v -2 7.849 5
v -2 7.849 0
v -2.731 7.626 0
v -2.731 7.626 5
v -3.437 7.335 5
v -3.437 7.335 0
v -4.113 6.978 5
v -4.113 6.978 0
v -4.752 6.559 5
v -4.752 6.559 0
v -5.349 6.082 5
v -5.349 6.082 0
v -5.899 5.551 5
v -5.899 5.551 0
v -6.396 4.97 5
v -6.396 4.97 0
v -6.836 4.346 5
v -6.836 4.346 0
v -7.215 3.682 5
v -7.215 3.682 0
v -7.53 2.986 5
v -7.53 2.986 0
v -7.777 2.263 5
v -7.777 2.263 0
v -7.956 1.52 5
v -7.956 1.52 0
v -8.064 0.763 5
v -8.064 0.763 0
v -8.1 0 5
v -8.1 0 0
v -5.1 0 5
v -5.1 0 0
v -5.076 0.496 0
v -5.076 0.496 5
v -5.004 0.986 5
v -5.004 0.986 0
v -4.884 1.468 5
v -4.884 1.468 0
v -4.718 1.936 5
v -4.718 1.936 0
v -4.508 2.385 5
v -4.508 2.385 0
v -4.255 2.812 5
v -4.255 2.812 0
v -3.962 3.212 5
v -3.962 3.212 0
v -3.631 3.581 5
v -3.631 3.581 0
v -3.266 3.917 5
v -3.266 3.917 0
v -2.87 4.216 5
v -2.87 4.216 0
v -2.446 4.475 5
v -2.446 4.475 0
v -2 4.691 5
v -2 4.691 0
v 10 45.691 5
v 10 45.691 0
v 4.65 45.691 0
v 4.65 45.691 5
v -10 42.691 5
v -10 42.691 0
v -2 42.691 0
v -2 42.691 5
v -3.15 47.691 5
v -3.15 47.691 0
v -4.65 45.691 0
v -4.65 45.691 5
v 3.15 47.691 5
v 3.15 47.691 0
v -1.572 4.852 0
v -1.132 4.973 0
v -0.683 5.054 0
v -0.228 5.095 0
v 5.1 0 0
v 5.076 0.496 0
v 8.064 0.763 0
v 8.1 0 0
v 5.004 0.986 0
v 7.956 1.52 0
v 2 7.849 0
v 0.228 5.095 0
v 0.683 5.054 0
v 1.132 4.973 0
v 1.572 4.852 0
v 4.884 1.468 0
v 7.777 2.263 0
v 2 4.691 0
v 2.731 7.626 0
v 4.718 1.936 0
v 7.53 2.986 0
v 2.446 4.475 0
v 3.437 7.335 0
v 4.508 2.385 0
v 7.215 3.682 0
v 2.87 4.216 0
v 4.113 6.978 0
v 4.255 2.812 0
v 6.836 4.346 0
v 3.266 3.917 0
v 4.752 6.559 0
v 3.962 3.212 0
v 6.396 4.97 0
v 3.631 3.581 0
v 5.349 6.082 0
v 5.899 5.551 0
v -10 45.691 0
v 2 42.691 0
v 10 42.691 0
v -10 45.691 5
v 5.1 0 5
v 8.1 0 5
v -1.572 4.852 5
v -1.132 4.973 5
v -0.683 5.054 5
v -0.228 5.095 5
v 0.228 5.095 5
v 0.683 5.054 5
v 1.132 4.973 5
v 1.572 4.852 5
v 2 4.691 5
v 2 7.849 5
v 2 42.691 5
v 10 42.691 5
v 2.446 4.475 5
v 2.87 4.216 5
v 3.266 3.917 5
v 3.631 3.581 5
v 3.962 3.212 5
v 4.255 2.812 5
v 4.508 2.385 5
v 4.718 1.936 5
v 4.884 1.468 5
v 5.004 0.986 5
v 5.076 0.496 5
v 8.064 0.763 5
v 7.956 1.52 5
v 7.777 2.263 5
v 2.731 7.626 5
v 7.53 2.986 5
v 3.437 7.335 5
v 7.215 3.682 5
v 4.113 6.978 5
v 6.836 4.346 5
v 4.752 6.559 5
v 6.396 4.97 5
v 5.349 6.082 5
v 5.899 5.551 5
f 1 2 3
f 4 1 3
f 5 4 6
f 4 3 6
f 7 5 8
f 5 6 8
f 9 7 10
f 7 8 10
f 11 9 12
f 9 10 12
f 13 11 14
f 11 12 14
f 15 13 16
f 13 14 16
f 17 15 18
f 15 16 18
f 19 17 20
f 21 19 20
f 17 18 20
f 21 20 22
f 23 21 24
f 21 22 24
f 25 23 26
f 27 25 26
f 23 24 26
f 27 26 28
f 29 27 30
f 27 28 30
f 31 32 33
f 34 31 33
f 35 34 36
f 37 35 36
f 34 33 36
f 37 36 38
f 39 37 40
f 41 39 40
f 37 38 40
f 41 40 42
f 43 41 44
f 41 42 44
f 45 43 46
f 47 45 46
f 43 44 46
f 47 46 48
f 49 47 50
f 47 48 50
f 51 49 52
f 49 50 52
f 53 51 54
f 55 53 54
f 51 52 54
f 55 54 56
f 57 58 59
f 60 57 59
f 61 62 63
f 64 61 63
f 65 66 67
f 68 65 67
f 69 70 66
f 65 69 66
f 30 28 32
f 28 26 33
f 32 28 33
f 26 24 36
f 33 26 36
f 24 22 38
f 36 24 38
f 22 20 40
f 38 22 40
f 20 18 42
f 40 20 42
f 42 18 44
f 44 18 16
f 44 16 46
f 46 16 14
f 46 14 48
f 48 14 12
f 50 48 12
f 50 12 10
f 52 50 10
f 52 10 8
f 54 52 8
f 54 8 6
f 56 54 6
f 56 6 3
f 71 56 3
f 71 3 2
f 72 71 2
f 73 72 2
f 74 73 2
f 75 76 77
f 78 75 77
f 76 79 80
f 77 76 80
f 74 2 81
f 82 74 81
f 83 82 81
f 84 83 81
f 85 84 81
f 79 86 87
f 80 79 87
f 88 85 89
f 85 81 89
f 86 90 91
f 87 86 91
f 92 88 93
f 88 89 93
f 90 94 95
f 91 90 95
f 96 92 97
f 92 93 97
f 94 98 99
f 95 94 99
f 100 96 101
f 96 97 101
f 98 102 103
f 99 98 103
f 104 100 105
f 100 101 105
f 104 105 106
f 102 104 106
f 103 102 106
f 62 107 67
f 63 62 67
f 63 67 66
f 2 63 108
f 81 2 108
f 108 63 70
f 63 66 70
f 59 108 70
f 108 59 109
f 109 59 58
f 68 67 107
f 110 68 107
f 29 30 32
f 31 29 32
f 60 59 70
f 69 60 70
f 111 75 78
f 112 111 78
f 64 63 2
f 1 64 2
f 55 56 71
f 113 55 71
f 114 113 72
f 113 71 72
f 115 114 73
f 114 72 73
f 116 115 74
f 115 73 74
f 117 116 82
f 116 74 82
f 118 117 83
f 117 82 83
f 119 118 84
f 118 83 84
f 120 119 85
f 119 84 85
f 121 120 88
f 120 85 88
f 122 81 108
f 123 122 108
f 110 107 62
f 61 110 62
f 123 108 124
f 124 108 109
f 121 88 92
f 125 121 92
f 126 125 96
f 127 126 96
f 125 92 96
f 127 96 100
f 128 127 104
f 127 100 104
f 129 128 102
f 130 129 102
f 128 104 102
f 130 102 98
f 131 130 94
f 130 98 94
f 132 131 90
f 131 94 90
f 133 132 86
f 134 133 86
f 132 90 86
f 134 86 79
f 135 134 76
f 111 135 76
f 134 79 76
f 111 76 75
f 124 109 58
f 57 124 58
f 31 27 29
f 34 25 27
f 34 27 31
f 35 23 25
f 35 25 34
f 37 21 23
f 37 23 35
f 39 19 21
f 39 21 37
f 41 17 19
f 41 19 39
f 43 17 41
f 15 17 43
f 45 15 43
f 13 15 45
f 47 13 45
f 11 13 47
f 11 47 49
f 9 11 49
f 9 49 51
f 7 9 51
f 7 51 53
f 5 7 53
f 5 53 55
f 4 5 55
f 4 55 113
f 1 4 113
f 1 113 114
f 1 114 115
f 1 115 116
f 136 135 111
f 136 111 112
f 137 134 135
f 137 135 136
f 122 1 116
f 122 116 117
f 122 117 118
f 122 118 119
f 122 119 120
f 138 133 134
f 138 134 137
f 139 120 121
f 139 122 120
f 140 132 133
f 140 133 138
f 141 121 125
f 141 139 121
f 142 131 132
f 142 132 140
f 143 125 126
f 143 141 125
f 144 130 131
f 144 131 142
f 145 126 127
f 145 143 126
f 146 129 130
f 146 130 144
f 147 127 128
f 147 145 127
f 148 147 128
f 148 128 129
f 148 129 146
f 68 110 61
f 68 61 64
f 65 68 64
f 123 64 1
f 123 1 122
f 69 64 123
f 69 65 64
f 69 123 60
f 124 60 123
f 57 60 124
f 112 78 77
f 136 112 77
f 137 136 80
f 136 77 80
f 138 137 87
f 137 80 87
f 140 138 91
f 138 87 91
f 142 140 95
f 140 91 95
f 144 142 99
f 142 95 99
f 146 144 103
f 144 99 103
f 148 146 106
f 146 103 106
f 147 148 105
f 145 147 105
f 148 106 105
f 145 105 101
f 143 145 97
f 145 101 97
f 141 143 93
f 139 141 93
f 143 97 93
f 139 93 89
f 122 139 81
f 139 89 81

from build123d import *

# Parameters (mm, degrees)
F1_DEPTH = 5


with BuildPart() as f1:
    # F0 (on Top) → F1 (new body)
    with BuildSketch(Plane.XY):
        with BuildLine():
            ThreePointArc((2, 4.691482), (4.254997, 2.811583), (5.1, 0))
            Line((5.1, 0), (8.1, 0))
            ThreePointArc((8.1, 0), (6.395702, 4.970412), (2, 7.849204))
            Line((2, 7.849204), (2, 4.691482))
        make_face()
        with BuildLine():
            ThreePointArc((-2, 4.691482), (0, 5.1), (2, 4.691482))
            Line((2, 4.691482), (2, 7.849204))
            ThreePointArc((2, 7.849204), (0, 8.1), (-2, 7.849204))
            Line((-2, 7.849204), (-2, 4.691482))
        make_face()
        with BuildLine():
            ThreePointArc((-5.1, 0), (-4.254997, 2.811583), (-2, 4.691482))
            Line((-2, 4.691482), (-2, 7.849204))
            ThreePointArc((-2, 7.849204), (-6.395702, 4.970412), (-8.1, 0))
            Line((-8.1, 0), (-5.1, 0))
        make_face()
        with BuildLine():
            ThreePointArc((-2, 7.849204), (0, 8.1), (2, 7.849204))
            Line((2, 7.849204), (2, 42.691482))
            Line((2, 42.691482), (-2, 42.691482))
            Line((-2, 42.691482), (-2, 7.849204))
        make_face()
        Polygon((-2, 42.691482), (2, 42.691482), (10, 42.691482), (10, 45.691482), (4.65, 45.691482), (-4.65, 45.691482), (-10, 45.691482), (-10, 42.691482), align=None)
        Polygon((-4.65, 45.691482), (4.65, 45.691482), (3.15, 47.691482), (-3.15, 47.691482), align=None)
    extrude(amount=F1_DEPTH)


solid = f1.part
